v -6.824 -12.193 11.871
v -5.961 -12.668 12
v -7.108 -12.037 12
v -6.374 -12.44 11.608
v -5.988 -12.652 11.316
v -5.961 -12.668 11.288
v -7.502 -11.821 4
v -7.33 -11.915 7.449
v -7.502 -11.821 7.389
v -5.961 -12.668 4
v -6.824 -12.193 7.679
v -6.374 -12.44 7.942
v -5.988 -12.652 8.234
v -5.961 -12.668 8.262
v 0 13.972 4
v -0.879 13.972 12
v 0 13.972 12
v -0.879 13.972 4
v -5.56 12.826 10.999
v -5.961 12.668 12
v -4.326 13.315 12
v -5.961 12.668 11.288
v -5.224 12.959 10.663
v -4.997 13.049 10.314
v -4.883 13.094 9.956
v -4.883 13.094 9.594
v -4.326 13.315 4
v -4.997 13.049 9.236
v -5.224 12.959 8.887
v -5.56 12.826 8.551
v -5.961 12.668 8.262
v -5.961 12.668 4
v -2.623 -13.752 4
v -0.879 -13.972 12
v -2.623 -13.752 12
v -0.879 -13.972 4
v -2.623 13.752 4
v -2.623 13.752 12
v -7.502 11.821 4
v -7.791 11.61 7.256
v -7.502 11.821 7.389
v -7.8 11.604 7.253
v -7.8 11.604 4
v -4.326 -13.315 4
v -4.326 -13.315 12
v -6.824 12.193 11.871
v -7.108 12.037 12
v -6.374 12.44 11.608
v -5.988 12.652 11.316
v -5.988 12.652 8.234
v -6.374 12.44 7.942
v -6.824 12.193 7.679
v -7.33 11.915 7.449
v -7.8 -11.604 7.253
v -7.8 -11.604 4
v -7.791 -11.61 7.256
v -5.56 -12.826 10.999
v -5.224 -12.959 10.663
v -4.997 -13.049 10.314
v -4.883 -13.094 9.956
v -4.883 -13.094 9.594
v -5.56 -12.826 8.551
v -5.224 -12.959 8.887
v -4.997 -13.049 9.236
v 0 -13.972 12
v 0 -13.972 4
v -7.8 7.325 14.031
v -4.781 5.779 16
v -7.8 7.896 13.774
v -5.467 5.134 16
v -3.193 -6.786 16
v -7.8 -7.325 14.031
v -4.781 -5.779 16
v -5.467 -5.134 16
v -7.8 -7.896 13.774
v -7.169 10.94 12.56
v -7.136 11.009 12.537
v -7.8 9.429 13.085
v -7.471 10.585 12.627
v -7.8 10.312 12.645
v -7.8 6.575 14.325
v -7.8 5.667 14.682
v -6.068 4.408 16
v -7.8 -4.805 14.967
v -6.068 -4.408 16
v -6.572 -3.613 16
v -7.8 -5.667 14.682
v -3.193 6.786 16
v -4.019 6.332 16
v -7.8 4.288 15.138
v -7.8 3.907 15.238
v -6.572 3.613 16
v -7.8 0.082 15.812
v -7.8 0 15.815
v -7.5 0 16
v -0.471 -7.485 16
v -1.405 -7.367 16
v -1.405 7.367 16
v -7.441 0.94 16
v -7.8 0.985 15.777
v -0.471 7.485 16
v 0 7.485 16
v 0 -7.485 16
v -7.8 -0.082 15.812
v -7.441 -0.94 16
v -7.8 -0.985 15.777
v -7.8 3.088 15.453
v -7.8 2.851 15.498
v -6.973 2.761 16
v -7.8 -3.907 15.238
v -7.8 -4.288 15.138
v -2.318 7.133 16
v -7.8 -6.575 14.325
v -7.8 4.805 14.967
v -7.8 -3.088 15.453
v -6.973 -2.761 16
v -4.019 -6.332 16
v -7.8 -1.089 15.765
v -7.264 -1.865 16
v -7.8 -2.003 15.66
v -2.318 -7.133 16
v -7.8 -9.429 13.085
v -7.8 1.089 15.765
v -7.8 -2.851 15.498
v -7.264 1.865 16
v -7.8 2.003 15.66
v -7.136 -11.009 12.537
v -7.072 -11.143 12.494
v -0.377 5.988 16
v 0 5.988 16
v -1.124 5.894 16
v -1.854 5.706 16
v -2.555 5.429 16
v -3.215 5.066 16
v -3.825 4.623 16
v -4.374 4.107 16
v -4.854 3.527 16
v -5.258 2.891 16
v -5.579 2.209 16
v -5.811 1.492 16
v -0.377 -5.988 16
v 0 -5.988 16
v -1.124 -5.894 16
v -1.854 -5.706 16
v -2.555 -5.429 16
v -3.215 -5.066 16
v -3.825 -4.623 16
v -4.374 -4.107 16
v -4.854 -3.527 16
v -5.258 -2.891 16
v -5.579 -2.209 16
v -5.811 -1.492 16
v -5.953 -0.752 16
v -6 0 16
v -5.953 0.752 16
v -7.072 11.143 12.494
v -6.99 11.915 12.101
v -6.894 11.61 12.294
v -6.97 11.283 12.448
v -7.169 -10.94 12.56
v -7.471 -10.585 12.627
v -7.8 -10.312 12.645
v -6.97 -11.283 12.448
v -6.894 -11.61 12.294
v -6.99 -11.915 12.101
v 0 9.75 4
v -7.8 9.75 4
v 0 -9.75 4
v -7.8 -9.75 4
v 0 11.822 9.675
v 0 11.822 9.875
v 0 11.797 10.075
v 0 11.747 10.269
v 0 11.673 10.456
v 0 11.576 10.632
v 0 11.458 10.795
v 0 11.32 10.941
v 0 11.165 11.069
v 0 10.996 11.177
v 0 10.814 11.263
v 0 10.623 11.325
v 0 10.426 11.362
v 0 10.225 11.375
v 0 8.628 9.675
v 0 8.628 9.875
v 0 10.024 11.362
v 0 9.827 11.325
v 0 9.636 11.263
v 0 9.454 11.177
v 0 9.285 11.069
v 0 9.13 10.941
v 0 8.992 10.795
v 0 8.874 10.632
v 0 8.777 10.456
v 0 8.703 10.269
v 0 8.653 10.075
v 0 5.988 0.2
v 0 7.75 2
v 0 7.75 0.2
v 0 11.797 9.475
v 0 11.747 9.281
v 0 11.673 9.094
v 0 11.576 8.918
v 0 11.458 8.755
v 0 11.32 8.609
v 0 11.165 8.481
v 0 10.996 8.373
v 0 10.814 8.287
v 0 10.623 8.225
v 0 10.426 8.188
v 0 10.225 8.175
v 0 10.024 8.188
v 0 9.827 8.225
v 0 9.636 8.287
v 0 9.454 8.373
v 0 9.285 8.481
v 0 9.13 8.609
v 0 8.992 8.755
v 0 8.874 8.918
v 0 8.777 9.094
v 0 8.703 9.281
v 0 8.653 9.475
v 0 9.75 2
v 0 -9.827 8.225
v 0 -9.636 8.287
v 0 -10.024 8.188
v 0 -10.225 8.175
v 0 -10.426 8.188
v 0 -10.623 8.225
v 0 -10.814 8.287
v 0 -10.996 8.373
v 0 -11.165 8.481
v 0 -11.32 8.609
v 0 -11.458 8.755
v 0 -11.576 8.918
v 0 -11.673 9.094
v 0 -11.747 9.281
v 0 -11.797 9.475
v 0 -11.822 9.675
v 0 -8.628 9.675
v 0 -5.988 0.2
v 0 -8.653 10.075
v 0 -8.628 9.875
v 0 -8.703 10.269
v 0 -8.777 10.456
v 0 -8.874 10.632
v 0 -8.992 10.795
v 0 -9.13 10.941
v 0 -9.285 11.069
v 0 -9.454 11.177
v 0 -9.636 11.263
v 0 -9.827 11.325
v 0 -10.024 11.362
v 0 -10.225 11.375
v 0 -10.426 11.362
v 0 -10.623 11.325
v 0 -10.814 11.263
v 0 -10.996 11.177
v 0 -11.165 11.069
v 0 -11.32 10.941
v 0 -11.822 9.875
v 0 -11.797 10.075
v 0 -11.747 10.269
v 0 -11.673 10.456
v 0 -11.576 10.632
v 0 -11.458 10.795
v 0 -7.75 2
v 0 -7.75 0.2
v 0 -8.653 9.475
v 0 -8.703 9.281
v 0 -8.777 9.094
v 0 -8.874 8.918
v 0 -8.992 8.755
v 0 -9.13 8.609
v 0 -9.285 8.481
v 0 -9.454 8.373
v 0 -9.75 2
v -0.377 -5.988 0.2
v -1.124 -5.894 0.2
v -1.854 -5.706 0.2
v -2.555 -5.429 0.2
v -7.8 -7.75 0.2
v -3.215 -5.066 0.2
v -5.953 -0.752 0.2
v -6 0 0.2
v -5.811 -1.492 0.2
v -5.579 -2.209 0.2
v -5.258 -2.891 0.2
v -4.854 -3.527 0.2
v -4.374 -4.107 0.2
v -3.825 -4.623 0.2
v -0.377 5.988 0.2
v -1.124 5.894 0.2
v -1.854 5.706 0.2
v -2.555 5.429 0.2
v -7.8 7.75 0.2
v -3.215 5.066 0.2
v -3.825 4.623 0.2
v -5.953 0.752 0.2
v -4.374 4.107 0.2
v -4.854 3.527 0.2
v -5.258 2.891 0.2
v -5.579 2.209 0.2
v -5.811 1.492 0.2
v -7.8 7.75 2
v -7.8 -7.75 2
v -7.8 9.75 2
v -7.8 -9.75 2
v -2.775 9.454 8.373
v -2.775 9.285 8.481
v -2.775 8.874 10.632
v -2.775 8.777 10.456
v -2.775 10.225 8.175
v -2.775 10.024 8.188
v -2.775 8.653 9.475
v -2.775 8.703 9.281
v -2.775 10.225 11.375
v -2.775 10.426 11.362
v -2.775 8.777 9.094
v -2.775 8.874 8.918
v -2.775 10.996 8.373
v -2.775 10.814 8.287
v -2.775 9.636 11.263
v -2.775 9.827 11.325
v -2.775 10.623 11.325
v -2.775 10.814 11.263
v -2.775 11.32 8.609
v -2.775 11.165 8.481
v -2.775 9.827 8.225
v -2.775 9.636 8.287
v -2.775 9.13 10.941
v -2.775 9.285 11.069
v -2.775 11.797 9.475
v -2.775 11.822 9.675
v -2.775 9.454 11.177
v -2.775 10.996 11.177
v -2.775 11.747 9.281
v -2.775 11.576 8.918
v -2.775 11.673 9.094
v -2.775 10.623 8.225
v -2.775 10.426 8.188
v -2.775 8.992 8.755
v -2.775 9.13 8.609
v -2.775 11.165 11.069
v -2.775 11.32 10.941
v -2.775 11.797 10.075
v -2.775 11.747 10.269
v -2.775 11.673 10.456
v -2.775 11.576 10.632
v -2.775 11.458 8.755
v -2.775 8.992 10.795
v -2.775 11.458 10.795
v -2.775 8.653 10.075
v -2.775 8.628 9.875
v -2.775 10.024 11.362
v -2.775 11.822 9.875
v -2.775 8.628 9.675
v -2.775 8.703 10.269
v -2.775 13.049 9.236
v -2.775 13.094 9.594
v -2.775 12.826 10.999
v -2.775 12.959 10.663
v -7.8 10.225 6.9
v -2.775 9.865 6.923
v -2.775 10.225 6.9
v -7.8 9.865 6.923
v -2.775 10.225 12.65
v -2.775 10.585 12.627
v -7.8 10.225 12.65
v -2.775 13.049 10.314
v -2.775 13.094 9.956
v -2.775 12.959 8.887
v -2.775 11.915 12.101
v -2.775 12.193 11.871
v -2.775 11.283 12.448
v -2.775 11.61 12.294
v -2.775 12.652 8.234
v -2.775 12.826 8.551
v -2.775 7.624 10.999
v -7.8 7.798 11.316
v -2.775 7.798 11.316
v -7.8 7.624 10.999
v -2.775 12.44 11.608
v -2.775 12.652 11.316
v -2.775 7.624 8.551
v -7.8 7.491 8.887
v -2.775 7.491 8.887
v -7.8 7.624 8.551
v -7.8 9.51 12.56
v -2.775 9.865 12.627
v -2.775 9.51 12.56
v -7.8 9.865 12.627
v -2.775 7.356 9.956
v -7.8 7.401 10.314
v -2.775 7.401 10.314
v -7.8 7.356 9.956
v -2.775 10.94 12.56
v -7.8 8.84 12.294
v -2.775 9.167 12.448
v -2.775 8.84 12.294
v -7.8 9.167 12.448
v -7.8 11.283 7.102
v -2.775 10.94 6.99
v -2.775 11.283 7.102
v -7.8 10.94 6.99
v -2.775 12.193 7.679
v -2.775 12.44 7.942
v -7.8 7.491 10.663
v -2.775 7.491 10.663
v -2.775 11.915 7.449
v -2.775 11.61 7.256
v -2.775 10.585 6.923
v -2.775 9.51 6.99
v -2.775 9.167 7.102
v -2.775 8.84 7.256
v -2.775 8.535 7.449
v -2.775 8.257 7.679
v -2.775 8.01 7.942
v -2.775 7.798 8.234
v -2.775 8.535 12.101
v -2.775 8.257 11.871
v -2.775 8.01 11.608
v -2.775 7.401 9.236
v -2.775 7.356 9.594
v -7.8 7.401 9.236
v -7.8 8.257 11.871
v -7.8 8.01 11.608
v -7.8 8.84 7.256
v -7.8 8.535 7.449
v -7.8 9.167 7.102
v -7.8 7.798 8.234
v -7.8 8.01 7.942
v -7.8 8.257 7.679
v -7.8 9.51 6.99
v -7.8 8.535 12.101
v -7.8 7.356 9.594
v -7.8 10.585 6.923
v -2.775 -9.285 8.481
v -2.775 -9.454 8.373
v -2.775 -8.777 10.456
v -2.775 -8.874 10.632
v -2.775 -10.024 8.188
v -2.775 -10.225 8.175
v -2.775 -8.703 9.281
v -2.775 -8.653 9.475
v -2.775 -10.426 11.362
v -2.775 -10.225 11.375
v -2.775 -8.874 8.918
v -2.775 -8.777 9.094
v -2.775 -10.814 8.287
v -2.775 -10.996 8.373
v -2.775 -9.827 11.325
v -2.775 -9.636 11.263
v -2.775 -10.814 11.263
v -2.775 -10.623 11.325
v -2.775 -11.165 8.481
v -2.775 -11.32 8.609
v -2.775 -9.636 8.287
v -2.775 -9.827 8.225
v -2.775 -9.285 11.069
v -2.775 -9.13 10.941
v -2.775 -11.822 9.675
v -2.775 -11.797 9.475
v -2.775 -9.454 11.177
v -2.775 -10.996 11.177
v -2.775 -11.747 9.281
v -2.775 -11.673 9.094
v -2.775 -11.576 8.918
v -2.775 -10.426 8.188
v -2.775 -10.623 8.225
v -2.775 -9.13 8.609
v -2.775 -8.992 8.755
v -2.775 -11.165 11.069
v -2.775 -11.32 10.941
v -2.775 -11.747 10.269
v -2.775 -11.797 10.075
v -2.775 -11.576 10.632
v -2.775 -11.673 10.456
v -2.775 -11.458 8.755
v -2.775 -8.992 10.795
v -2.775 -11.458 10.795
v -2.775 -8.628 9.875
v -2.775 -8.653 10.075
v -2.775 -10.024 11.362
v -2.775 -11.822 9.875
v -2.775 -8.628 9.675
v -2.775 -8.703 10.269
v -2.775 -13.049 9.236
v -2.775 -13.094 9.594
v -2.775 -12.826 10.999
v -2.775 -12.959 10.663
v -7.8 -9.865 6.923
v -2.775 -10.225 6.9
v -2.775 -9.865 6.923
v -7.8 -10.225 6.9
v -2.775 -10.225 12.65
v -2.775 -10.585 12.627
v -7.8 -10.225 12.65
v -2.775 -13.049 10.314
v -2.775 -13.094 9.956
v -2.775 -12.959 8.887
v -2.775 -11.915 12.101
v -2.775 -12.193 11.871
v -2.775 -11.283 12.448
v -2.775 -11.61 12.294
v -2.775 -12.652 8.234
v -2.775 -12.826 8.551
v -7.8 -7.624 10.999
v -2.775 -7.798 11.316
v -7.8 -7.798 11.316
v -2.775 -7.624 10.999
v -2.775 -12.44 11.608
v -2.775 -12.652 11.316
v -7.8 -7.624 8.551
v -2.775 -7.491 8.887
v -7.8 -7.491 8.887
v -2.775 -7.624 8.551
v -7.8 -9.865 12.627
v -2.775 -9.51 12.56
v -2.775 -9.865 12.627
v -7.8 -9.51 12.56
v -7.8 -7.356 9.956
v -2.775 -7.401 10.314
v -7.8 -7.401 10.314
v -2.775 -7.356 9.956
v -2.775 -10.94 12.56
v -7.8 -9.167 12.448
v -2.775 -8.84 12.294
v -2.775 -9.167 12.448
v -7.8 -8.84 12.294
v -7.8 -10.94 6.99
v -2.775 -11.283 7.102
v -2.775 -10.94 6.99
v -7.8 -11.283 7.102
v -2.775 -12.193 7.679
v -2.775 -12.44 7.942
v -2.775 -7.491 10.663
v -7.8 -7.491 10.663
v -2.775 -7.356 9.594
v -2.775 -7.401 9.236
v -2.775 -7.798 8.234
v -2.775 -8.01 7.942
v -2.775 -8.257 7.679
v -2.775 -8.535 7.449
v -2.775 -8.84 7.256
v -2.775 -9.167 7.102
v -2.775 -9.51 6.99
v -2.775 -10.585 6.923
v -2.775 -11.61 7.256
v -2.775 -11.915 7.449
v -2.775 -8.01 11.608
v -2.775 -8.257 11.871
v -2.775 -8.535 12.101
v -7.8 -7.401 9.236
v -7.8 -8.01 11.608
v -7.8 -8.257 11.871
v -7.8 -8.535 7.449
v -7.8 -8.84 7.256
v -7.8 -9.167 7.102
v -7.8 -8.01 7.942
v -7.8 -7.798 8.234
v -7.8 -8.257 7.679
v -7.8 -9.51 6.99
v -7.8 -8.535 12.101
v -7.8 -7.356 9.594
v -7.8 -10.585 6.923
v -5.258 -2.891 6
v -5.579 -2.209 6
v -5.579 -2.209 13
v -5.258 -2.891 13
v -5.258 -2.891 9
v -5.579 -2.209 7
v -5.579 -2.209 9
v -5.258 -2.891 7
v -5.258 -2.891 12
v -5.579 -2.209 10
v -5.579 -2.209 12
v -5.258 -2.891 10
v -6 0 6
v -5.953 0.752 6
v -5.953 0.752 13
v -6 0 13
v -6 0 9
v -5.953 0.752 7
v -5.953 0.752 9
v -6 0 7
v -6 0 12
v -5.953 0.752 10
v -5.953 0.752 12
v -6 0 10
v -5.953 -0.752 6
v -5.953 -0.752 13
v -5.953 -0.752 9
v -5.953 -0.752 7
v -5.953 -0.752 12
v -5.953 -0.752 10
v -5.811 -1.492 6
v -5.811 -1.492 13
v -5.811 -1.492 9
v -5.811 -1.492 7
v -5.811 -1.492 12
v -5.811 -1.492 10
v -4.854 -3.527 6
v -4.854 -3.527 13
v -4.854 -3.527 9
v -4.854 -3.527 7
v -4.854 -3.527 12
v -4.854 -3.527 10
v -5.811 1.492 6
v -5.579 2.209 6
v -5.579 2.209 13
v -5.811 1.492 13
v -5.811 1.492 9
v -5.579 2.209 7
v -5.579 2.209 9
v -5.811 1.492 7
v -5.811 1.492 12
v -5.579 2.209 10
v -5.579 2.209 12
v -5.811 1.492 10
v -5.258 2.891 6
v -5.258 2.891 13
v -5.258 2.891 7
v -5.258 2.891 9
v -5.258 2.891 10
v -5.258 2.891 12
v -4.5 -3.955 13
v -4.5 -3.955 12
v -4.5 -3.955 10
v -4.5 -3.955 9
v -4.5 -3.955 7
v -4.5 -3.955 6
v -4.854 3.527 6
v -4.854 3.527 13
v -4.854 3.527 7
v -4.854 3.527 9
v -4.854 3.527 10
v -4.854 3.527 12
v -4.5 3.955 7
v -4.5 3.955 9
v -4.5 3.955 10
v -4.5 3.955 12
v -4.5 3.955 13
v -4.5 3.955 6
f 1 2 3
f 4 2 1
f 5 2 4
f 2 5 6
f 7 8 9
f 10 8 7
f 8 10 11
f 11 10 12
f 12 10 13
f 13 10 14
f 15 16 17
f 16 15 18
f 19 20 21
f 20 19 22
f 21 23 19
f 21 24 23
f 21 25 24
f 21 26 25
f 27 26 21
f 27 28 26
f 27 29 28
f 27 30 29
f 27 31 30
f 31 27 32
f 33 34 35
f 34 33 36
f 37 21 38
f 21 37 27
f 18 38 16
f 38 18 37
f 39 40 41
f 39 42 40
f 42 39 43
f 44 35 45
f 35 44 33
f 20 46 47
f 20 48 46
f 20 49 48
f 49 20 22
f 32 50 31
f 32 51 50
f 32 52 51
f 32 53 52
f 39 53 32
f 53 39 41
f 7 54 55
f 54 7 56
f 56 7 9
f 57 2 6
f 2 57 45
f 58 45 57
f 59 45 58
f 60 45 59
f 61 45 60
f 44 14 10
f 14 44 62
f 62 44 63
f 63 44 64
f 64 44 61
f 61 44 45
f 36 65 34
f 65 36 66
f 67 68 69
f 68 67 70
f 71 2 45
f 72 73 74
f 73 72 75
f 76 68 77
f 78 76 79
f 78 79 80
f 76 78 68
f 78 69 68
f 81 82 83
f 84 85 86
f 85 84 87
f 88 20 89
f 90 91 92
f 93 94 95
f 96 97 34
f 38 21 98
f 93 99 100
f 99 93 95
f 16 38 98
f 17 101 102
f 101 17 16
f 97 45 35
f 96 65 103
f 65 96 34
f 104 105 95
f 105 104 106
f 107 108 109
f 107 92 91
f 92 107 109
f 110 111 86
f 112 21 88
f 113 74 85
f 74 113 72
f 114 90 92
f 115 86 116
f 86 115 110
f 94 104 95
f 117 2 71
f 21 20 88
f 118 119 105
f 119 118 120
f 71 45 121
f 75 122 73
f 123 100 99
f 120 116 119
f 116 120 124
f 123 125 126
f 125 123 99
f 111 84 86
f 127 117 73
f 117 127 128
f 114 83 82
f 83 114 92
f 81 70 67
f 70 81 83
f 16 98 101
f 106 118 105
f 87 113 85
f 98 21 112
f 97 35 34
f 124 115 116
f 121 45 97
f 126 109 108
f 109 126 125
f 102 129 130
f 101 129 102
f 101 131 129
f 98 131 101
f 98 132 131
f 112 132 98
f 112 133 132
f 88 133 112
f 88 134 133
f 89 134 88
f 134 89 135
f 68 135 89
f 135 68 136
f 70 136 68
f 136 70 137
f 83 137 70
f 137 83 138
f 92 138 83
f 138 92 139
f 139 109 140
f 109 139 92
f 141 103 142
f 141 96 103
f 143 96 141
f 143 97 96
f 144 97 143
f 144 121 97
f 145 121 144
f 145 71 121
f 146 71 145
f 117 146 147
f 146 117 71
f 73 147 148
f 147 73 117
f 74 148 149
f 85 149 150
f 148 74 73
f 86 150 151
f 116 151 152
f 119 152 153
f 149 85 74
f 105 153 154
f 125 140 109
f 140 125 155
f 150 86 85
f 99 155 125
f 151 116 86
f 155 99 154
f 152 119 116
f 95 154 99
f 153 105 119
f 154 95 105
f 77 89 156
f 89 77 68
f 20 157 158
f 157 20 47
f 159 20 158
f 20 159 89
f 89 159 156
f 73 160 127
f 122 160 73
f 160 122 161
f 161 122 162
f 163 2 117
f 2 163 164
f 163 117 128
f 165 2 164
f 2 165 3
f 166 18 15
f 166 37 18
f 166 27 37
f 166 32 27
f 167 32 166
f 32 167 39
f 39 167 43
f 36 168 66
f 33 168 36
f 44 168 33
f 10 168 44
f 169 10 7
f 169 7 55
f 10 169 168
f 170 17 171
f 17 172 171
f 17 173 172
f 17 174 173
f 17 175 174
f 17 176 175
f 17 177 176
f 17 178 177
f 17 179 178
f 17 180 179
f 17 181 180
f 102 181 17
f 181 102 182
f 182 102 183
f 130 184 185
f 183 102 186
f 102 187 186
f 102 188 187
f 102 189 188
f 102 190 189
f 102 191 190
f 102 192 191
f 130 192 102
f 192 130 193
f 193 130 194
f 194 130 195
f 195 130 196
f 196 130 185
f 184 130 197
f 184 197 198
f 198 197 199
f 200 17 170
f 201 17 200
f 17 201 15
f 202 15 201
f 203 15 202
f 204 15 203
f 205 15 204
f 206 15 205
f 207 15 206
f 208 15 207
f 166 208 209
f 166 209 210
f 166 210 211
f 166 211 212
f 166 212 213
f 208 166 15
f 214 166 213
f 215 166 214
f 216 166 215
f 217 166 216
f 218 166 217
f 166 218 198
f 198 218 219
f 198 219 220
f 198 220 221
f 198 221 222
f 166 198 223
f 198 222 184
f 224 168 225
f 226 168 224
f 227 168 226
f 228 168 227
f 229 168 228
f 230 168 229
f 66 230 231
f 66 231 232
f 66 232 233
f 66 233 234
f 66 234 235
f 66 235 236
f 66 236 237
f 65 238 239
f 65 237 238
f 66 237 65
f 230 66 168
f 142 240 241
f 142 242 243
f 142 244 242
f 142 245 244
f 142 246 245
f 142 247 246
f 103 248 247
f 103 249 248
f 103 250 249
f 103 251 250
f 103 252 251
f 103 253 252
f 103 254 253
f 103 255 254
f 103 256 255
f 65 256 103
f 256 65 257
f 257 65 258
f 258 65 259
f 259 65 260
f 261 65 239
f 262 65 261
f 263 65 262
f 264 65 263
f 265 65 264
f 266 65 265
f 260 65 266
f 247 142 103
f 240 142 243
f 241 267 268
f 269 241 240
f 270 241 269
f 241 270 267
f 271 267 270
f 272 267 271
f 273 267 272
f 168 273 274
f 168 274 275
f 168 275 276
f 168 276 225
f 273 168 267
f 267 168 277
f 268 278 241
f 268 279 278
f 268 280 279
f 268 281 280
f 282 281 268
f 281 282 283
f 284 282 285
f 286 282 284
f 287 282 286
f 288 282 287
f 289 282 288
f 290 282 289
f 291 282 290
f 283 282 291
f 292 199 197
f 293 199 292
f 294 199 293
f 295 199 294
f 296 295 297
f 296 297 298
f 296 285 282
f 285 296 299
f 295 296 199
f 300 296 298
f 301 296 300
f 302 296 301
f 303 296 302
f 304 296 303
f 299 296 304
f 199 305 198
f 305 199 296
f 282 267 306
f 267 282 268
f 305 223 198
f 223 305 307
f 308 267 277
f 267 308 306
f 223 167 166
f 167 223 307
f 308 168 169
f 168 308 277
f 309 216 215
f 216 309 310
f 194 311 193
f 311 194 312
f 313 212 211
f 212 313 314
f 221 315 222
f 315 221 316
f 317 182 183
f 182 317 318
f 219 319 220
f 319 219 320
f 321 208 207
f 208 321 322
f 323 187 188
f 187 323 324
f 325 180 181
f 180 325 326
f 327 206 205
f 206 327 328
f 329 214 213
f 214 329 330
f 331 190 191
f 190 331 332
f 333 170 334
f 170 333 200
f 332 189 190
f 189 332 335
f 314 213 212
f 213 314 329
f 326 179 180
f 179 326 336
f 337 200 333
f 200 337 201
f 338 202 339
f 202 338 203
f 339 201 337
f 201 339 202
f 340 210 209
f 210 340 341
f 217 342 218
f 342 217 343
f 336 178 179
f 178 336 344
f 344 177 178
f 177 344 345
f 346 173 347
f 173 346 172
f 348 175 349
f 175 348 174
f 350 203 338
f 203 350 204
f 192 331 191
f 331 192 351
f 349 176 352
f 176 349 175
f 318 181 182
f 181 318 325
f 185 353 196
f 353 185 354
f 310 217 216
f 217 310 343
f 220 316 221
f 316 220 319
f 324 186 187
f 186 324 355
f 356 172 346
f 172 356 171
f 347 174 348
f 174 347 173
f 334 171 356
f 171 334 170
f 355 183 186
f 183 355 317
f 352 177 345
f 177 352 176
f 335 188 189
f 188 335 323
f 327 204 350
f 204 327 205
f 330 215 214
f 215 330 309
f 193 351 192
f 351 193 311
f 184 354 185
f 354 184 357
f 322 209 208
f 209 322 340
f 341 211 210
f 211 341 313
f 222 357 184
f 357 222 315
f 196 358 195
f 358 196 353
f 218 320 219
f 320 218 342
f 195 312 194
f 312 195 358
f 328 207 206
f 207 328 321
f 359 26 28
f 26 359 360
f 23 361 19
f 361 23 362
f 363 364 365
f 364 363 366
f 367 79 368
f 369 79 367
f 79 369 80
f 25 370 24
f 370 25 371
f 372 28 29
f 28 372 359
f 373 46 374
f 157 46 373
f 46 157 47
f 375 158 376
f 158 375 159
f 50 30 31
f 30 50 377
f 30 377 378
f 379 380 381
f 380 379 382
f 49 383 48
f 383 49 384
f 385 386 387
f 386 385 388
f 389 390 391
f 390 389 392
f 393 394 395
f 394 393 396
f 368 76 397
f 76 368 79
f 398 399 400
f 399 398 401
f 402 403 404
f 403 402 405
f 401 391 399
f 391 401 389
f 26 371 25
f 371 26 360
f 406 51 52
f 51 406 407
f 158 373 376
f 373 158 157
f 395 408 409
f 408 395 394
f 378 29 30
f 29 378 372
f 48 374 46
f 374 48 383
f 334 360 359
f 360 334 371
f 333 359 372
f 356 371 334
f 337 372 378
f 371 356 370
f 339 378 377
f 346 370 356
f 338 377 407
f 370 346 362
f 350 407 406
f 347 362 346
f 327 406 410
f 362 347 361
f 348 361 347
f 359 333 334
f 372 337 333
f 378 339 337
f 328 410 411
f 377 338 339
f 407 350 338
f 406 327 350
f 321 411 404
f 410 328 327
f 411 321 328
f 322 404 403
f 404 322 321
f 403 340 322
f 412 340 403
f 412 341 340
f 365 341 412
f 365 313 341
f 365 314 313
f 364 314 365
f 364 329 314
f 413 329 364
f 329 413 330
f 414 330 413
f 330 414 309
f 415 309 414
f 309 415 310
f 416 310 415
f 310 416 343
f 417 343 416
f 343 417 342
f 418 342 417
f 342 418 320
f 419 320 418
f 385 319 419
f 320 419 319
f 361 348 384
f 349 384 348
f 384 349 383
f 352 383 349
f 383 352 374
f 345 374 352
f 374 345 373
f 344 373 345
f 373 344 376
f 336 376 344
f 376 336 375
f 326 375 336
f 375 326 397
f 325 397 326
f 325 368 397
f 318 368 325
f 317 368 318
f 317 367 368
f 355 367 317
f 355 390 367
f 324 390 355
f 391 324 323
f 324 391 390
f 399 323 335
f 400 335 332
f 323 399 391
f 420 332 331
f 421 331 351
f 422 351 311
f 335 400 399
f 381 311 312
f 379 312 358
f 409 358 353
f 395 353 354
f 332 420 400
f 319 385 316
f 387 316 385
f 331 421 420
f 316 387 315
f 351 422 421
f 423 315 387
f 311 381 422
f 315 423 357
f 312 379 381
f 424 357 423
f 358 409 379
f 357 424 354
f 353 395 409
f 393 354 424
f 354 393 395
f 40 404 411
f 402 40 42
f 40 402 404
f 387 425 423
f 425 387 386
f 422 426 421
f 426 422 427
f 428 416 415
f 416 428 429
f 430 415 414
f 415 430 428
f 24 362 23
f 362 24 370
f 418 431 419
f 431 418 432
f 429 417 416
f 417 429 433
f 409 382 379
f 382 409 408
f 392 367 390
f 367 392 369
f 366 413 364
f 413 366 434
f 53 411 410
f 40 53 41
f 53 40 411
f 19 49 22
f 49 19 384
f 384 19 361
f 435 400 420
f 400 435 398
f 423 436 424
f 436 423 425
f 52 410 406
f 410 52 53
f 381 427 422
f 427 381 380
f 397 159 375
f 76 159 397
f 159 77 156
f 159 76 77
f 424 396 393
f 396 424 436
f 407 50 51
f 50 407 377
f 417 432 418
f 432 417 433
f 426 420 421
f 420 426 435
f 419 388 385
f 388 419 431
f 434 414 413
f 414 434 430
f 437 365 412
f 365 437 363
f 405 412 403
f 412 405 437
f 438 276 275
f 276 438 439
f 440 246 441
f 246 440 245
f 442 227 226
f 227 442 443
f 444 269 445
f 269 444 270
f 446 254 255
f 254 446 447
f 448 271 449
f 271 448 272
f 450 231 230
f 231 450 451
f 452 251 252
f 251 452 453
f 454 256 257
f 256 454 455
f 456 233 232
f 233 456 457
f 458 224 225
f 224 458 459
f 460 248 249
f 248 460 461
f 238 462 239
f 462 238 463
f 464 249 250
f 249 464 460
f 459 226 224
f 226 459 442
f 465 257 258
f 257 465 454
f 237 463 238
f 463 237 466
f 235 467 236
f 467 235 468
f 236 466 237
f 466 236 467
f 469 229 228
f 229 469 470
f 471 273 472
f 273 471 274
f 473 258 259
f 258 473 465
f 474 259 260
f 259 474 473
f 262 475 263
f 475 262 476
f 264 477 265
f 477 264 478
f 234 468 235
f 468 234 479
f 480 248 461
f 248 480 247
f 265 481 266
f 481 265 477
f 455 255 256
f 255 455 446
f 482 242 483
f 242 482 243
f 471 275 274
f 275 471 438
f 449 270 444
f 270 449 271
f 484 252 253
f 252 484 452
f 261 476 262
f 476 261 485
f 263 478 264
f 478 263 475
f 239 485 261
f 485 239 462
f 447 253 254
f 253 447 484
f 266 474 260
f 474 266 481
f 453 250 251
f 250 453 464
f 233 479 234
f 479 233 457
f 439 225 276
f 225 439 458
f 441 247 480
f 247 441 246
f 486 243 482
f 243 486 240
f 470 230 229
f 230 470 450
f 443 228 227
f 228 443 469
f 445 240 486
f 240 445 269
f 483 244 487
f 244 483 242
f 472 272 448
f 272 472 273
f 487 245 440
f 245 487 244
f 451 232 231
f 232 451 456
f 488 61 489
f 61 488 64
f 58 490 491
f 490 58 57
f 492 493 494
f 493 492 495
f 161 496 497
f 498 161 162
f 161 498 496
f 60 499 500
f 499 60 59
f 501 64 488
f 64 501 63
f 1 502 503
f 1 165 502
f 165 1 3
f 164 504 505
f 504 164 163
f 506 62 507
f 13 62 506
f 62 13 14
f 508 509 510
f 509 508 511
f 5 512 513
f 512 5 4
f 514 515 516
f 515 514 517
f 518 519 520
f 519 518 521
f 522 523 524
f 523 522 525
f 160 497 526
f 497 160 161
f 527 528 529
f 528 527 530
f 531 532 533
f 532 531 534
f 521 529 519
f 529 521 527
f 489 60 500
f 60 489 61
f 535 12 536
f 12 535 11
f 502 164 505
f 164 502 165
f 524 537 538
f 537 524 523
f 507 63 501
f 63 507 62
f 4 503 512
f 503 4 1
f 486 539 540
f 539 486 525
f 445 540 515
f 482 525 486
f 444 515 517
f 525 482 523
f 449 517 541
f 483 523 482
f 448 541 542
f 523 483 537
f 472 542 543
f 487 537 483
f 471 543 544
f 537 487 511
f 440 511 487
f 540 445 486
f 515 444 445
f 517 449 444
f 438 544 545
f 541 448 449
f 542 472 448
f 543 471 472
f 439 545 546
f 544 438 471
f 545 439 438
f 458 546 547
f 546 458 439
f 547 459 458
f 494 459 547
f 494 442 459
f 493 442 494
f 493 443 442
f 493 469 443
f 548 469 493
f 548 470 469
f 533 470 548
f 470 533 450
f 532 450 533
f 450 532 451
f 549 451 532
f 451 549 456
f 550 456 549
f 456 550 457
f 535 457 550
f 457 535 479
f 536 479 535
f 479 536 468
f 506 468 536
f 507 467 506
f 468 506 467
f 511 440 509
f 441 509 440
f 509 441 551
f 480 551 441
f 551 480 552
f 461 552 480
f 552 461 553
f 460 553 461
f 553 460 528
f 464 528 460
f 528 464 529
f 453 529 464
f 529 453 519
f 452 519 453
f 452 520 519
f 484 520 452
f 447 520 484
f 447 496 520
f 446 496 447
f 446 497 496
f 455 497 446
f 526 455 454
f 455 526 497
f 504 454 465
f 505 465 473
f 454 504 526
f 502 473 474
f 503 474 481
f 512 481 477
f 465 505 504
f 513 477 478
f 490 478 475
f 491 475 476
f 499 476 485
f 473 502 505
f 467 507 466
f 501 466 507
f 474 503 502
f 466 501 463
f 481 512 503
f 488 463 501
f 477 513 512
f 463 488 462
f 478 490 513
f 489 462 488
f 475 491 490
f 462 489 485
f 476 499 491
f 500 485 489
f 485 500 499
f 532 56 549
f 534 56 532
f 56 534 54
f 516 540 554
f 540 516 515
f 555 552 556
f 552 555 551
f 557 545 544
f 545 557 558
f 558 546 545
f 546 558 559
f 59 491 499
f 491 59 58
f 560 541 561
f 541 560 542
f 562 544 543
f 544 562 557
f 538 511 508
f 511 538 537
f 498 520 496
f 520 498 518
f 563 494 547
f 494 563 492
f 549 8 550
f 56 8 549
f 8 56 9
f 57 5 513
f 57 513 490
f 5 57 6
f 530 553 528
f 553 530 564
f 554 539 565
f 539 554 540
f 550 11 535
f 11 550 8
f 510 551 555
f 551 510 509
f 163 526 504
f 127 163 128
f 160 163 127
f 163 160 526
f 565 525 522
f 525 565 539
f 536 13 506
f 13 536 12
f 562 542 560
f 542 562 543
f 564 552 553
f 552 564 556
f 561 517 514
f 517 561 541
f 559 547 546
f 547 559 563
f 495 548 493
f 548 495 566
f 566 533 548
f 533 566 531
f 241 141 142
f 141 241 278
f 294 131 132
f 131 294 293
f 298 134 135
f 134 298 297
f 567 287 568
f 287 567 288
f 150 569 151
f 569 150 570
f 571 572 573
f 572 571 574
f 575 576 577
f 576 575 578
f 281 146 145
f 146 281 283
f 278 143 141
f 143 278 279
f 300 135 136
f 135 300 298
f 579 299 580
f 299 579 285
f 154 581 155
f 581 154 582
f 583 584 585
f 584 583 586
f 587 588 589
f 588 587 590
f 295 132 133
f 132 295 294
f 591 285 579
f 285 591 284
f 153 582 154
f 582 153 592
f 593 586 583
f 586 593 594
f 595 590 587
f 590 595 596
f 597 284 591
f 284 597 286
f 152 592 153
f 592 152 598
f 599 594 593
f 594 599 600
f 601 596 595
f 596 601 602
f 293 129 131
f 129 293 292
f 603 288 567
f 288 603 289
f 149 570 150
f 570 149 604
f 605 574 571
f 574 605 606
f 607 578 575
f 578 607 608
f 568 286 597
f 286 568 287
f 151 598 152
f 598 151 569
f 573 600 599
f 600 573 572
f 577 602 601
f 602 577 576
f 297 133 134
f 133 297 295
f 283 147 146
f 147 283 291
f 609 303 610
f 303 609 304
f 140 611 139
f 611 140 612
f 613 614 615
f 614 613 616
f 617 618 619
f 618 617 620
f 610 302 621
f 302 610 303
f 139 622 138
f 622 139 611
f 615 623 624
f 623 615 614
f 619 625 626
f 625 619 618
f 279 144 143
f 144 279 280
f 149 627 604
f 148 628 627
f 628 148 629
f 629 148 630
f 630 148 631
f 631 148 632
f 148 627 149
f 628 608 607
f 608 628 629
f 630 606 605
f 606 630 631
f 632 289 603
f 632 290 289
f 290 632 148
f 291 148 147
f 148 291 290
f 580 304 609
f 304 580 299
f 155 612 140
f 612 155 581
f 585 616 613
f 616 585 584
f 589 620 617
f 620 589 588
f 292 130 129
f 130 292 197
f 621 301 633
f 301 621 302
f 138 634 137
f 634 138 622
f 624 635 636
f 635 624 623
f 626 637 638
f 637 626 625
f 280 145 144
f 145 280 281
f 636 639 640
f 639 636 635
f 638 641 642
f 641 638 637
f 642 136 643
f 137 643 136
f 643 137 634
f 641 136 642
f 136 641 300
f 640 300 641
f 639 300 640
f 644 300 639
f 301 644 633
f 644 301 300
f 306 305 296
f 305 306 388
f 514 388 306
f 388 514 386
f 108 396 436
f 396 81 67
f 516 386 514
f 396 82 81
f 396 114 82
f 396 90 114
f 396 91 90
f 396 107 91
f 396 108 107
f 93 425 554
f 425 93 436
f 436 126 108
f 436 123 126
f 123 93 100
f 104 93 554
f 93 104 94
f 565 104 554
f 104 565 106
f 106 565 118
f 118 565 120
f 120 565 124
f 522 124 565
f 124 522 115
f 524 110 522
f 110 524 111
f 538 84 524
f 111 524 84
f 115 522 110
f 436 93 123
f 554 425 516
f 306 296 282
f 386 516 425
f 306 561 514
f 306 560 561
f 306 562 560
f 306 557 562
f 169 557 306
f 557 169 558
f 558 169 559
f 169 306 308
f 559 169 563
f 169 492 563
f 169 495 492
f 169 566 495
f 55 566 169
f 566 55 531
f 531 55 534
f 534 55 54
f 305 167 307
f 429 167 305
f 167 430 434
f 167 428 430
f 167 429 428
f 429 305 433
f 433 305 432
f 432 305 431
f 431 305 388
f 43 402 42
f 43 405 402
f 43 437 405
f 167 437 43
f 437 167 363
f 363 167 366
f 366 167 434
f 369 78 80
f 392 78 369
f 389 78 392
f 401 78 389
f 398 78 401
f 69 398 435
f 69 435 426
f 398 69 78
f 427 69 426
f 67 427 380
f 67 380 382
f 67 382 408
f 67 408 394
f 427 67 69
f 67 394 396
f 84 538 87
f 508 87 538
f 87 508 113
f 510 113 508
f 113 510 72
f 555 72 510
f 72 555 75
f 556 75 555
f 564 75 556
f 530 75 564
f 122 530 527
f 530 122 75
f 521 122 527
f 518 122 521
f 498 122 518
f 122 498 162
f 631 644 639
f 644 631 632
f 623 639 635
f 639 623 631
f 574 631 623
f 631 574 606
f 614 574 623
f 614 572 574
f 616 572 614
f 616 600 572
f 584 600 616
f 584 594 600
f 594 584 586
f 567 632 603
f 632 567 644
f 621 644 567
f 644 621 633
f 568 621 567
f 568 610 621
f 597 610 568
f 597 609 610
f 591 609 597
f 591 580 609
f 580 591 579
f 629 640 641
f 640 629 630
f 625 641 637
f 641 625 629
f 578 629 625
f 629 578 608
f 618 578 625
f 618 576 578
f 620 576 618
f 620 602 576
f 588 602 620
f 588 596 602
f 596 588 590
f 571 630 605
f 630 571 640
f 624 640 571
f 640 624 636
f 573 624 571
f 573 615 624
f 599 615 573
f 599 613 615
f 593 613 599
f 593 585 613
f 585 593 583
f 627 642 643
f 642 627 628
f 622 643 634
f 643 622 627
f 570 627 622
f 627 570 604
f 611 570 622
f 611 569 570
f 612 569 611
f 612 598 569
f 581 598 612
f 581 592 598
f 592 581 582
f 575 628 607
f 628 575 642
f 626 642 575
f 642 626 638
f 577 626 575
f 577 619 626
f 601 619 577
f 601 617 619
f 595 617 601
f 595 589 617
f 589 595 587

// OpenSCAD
// file: ../settings/dimensions.scad
// Defualt Quality
$fn = 50;

// PCB Dimensions - mm
pcb_l = 109.67;
pcb_w = 84.30;
pcb_t = 1.6;

hole_dia = 3.2;
hole_x_spacing = 101.85;
hole_y_spacing = 76.10;

// PCB Component Locations - mm from center
usb_x = (-pcb_l/2) + 24.11;
usb_y = (-pcb_w/2);

uSD_x = (-pcb_l/2) + 42.46;
uSD_y = (-pcb_w/2) - 0.71;

// TMC2130 Dimensions - mm
tmc_l = 20.32;
tmc_w = 15.24;
tmc_t = 1.6;
tmc_offset_from_pcb = 11.05;


// Global Enclosure Settings
pcb_mnt_pattern = [[0,0],[hole_x_spacing,0],[0,hole_y_spacing],[hole_x_spacing,hole_y_spacing]];
x_clearance = 25;
y_clearance = 3;
m3_clearance_dia = 3.2;
wall_height = 38;
// main file
include <../settings/dimensions.scad>

module m3_bolt_hole() {
    translate([-(5.55/2),(28/2)-(5.55/2)-1,(-10/2)+(5.55/2)+((9/2)+10-2.5)]) {
        rotate([0,270,0])cylinder(h=25,d=m3_clearance_dia, center=true);
        rotate([0,270,0])cylinder(h=10, d=5.75);
    }
}

module extruder_clamp() {
    difference() {
        union() {
            // base shape
            difference() {
                union() {
                    cylinder(h=12,d=28);
                    translate([0,0,12])cylinder(h=4, d1=28, d2=15);
                }

                // cut some of the bottom off
                translate([-20,-20,-1])cube([21,40,5]);
            }
            
            // inset 
            translate([-15,-15.5/2,0.2])cube([15,15.5,4.5]);
            translate([-15,-19.5/2,2])cube([15,19.5,2]);
        }

        // cable hole
        translate([0,0,-5])cylinder(h=25, d=12);

        // m3 bolt holes
        m3_bolt_hole();
        mirror([0,1,0])m3_bolt_hole();

        // Split in half
        translate([0,-20,-0.1])cube([20,40,40]);

        // cut off some of the back
        translate([-27.8,-20,-1])cube([20,40,20]);
    }

    // cable ribbing for grip
    for (z=[6:3:12]) {
        translate([-6,-6,z])cube([1.5,12,1]);
    }
}

extruder_clamp();
